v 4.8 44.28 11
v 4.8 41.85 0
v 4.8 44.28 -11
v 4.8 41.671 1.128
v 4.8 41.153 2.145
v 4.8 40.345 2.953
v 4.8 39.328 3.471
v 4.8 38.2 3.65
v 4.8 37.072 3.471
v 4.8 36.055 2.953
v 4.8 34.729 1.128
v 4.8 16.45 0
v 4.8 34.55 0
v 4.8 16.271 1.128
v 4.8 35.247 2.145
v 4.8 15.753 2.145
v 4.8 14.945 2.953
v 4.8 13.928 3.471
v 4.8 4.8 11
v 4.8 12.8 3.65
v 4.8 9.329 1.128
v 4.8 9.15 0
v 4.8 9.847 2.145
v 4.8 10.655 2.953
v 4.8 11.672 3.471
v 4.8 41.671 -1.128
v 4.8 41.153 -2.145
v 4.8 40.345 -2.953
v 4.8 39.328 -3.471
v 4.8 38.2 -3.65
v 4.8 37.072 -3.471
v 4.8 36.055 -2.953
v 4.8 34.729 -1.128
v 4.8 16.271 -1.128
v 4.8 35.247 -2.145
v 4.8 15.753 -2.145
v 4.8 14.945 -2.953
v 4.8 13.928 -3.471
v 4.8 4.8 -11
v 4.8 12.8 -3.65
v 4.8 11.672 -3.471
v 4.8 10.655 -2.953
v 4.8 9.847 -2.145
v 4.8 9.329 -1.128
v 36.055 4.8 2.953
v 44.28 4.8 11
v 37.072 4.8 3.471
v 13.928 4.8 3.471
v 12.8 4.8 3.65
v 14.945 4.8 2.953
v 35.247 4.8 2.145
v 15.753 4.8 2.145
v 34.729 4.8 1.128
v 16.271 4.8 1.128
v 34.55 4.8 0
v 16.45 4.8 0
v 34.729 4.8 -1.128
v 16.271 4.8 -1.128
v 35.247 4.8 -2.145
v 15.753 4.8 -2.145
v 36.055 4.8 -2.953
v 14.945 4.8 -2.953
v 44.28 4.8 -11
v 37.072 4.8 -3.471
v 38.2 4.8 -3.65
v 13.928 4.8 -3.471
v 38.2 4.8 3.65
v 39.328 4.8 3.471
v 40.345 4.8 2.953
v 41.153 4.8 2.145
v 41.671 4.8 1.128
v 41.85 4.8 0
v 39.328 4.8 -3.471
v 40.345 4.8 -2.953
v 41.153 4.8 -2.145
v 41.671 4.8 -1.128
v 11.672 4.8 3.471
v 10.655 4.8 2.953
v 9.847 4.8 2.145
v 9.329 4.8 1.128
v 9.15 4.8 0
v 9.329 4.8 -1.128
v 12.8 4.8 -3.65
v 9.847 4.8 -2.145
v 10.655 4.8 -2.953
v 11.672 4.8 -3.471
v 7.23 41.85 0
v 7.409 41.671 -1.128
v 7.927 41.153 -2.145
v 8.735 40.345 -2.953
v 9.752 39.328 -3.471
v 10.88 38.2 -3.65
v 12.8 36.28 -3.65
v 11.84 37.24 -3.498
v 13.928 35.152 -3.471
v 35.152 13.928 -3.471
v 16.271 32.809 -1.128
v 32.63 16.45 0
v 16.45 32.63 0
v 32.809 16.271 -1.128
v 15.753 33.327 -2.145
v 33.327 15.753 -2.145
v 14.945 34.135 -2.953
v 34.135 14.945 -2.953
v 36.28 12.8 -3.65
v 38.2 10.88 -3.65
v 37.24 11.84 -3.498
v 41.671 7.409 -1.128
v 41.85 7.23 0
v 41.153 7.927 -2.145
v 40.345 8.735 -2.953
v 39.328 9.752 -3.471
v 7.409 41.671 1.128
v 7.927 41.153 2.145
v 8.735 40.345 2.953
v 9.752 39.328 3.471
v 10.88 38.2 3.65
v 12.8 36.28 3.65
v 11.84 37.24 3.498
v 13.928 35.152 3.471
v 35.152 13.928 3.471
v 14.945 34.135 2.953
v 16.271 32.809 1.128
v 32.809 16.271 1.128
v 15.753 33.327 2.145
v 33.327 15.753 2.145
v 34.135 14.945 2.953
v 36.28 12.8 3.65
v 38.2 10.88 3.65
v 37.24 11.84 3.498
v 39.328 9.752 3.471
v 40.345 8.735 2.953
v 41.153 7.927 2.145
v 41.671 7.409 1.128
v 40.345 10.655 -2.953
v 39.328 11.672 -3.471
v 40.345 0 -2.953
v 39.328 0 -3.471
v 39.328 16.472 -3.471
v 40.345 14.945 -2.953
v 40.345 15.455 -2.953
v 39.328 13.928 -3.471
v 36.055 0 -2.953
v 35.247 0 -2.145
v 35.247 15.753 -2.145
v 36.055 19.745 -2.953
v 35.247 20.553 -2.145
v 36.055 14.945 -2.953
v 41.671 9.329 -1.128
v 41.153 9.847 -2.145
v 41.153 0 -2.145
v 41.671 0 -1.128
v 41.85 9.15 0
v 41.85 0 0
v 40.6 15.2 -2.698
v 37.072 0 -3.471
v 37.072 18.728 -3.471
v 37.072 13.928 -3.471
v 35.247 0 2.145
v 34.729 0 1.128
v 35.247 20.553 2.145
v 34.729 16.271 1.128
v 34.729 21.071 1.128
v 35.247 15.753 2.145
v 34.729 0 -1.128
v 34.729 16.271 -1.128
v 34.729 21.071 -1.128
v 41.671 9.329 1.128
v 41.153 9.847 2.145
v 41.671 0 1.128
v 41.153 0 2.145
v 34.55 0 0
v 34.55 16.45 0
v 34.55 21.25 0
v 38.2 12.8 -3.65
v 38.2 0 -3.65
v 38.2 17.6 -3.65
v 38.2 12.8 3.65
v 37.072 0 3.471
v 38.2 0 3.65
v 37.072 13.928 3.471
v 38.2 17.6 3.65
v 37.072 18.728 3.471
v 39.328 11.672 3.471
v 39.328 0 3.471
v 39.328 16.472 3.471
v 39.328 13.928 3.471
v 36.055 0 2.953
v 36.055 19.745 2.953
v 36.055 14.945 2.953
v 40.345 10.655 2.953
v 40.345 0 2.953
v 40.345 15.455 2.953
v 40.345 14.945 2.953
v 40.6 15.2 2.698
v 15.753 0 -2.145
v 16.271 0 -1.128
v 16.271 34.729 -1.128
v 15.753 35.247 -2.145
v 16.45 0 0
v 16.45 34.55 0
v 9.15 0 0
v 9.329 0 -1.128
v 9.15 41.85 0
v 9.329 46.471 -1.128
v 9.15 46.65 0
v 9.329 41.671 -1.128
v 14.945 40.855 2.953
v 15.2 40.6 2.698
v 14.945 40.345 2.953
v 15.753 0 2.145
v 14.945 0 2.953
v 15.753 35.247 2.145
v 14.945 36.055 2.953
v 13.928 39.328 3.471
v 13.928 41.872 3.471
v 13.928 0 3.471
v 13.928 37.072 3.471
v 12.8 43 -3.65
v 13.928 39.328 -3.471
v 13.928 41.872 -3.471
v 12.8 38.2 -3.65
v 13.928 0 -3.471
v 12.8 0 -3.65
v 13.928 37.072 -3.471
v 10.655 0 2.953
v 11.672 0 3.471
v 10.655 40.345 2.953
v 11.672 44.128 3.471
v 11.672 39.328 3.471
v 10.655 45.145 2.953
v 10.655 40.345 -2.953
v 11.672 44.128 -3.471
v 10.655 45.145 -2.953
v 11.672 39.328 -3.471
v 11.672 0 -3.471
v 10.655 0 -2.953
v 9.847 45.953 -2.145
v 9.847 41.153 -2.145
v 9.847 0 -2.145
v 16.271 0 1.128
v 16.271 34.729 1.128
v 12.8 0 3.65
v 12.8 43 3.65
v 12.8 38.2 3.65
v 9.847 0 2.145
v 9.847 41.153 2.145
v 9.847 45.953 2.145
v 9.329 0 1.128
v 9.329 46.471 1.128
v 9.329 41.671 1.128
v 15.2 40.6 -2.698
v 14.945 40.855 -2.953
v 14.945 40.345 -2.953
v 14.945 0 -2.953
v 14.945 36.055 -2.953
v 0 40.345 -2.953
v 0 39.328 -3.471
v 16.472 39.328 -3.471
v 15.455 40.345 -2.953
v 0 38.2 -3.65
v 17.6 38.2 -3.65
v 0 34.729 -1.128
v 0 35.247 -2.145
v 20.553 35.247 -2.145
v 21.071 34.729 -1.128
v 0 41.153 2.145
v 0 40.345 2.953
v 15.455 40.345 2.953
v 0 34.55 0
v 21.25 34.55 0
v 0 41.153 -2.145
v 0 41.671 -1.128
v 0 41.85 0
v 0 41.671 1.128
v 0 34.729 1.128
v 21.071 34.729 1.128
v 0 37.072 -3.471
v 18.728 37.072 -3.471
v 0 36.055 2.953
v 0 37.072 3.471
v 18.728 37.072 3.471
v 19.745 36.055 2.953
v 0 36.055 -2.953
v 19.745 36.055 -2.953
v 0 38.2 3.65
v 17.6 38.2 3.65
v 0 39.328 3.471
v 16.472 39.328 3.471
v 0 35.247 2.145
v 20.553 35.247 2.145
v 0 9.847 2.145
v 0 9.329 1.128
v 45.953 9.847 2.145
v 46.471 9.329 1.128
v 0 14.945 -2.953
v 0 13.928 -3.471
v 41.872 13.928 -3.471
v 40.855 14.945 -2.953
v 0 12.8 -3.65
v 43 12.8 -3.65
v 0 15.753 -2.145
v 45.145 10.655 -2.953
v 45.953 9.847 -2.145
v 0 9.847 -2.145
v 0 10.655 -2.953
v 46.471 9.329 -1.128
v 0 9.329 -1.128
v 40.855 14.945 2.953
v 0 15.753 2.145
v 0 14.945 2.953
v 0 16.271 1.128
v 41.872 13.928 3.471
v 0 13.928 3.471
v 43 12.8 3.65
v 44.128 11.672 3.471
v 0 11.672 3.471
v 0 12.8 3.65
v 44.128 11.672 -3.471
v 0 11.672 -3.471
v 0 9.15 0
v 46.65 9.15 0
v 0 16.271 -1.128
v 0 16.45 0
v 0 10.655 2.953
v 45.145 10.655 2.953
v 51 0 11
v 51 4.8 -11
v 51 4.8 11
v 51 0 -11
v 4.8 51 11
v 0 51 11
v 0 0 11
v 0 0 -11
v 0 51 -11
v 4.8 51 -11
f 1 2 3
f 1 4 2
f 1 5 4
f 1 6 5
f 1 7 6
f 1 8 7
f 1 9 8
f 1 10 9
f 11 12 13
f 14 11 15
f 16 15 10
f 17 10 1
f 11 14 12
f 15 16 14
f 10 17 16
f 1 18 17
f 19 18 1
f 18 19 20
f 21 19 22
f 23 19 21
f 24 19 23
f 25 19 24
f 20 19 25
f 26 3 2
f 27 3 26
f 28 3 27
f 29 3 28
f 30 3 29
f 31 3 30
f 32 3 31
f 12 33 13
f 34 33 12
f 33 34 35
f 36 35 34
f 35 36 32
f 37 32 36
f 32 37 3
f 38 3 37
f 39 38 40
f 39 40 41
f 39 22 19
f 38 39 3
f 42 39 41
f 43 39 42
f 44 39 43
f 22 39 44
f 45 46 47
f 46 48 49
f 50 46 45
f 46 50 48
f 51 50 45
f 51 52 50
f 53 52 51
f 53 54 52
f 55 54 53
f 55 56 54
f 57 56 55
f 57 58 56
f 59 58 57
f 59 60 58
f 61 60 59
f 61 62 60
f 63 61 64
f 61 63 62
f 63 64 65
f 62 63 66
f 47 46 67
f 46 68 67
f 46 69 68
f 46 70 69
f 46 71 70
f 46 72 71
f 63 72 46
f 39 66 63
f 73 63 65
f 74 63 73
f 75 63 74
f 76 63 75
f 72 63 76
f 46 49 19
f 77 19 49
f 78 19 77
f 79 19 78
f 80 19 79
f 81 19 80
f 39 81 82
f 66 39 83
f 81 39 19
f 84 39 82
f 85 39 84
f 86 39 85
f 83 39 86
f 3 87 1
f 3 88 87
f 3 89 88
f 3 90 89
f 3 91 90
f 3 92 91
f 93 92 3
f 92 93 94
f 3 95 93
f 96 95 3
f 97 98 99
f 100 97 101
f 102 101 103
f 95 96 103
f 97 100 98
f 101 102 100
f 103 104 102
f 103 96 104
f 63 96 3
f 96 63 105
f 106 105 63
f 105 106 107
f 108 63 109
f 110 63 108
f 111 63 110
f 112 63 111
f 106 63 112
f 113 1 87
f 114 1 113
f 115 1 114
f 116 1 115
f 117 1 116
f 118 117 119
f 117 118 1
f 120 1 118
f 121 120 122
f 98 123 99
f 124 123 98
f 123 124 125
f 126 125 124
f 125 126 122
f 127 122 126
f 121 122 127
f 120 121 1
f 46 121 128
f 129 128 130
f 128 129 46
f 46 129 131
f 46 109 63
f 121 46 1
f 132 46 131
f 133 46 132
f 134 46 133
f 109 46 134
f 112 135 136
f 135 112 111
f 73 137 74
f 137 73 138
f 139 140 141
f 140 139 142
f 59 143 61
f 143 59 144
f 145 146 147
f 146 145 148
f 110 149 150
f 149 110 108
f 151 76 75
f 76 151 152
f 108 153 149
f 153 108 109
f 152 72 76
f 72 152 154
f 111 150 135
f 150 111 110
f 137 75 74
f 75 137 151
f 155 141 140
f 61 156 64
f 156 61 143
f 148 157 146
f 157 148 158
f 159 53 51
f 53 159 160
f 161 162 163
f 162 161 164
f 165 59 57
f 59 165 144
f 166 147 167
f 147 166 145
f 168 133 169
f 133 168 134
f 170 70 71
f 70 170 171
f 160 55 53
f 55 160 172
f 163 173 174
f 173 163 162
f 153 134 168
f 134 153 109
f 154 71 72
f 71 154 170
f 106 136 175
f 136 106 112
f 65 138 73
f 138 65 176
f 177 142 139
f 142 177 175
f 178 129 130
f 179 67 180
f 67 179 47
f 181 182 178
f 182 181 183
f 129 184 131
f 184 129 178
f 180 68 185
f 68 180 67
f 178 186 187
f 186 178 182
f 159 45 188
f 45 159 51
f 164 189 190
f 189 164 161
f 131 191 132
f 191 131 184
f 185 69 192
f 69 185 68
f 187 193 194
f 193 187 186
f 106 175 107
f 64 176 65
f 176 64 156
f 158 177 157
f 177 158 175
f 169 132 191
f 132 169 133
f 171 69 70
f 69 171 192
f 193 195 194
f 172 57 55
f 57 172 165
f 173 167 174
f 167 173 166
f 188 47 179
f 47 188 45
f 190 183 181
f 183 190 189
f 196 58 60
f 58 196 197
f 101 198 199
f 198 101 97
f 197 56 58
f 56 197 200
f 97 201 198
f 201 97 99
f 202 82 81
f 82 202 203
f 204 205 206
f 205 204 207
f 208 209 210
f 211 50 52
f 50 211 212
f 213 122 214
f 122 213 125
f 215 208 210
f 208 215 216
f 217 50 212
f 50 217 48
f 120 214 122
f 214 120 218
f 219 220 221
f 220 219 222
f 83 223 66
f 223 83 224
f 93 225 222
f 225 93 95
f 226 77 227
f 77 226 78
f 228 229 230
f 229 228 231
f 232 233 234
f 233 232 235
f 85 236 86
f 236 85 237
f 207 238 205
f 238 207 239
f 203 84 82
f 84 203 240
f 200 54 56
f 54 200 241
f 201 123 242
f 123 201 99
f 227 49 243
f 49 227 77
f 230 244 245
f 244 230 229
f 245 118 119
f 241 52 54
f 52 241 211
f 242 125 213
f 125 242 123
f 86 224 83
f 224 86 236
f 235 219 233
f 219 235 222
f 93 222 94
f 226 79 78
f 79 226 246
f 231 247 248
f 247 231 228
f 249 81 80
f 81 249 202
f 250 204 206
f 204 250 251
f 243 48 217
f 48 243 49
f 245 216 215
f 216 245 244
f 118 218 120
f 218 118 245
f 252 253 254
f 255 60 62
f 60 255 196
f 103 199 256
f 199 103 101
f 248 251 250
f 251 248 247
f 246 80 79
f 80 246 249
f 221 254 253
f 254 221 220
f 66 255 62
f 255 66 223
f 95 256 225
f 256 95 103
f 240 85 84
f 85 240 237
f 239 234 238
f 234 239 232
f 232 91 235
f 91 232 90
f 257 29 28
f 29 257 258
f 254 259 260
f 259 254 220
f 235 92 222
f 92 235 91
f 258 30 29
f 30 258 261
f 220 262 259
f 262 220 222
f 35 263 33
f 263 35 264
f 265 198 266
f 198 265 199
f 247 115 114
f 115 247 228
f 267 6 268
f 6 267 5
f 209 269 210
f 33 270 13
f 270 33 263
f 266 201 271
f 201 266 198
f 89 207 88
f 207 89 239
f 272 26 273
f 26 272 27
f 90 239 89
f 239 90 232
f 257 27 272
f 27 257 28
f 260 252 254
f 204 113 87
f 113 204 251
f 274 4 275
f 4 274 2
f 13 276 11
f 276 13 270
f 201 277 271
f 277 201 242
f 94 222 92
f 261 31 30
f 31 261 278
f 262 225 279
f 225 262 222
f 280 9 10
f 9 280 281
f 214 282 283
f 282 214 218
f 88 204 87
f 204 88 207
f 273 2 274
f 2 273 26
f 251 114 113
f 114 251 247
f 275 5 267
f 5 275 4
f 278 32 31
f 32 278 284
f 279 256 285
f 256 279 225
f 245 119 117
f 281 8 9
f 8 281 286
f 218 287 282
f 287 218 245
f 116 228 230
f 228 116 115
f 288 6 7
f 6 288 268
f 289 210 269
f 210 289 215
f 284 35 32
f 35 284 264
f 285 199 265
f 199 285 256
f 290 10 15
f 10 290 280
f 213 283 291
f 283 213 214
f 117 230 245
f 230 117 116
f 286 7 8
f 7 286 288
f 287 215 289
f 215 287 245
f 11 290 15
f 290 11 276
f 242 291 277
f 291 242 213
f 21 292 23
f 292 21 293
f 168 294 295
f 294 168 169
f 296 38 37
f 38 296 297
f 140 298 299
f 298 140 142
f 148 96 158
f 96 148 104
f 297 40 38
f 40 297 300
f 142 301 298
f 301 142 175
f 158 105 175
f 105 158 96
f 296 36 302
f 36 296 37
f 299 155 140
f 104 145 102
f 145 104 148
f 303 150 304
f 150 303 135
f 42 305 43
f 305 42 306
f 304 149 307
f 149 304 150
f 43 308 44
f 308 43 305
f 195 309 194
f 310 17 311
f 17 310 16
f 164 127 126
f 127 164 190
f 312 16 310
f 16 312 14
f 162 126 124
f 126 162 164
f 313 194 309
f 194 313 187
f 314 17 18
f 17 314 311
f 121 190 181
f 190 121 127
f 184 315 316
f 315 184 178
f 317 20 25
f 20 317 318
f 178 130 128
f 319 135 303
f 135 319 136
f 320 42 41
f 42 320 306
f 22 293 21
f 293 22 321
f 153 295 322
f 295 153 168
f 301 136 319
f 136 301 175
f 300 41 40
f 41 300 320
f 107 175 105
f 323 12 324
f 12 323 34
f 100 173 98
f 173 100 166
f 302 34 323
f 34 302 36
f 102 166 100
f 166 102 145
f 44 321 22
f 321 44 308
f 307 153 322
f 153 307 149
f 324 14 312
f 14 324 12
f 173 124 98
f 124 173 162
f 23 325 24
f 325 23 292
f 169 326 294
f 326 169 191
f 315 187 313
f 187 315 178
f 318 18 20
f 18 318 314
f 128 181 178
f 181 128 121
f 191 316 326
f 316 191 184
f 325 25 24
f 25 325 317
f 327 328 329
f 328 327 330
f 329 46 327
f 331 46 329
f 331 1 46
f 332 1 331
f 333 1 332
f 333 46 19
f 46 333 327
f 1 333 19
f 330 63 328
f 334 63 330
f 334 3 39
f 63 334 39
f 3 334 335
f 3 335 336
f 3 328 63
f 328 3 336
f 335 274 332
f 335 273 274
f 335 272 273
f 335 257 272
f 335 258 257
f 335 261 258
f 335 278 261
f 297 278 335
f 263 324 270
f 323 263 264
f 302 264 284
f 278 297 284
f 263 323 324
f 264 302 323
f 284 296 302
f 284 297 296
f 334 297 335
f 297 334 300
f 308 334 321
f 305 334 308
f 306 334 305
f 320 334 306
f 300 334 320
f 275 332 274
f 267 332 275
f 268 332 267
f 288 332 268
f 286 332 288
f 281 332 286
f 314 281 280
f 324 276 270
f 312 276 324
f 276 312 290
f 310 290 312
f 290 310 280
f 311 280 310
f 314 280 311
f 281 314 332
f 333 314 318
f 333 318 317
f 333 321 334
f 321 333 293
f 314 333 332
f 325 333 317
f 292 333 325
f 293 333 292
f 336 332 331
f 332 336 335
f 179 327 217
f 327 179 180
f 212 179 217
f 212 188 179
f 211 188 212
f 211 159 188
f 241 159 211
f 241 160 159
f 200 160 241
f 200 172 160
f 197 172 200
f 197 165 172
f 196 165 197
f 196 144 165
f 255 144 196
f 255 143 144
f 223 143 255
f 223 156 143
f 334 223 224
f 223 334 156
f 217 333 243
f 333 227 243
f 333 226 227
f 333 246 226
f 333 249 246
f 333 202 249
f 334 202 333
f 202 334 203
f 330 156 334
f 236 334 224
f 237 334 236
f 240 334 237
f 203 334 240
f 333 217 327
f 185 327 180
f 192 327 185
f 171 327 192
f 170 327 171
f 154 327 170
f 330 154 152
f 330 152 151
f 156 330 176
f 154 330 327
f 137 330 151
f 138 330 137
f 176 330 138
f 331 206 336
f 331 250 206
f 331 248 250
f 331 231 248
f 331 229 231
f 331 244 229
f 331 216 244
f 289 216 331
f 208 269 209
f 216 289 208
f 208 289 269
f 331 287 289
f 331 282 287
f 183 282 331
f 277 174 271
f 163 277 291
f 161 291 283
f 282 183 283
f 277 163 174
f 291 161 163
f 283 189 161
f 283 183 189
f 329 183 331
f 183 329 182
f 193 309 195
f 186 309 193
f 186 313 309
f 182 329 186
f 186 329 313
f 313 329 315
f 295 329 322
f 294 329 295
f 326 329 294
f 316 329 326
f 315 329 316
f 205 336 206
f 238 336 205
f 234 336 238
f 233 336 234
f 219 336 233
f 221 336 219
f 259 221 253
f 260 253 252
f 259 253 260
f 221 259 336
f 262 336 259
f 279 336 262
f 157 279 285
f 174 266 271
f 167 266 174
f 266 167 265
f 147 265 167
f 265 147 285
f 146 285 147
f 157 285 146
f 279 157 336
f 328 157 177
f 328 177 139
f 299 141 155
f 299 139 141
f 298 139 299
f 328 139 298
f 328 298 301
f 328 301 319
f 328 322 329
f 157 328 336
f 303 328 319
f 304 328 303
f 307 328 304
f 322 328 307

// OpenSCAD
//Extrusion($Type = "Extruded", $Sections = 1);
//Extrusion($Type = "Hollow", $Dimension = 15, $Dimension2 = 30);
CornerBrace($Width = 22,$Length = 51, $MaterialThickness = 4.8, $HoleCenters = 25.4, $HoleSize = 7.3);

module ExtrusionSlot($Rotation = 0)
{
  rotate($Rotation, [1, 0, 0])
  {
    translate([0, 0, 2.51 * $Dimension / 6])
      cube([$Length + 1, $Dimension / 3, $Dimension / 6], center = true);
    translate([0, 0, 2.01 * $Dimension / 6])
      cube([$Length + 1, $Dimension / 2.4, $Dimension / 6], center = true);
  }
}

module Extrusion1x()
{
  color("Silver")
    difference()
    {
      cube([$Length, $Dimension, $Dimension], center = true);
      rotate(90, [0, 1, 0])
        cylinder(d = $Bore, h = $Length + 1, center = true, $fn = 20);
      ExtrusionSlot(0);
      ExtrusionSlot(90);
      ExtrusionSlot(-90);
      ExtrusionSlot(180);
    }
}

module Extrusion($Type = "Extruded", $Dimension = 15, $Dimension2 = 15, $Length = 100, $Bore = 4.8, $Thickness = 2.6, $Sections = 1)
{
  if ($Type == "Extruded")
  {
    translate([0, -$Dimension * ($Sections - 1) / 2, 0])
    for ( i = [0 : $Sections - 1])
    {
      translate([0, i * $Dimension, 0])
        Extrusion1x();
    }
  }
  else if ($Type == "Hollow")
  {
    color("Silver")
      difference()
      {
        cube([$Length, $Dimension2, $Dimension], center = true);
        cube([$Length + 1, $Dimension2 - ($Thickness * 2), $Dimension - ($Thickness * 2)], center = true);
      }
  }
}

module CornerBrace($Width = 22,$Length = 51, $MaterialThickness = 4.8, $HoleCenters = 25.4, $HoleSize = 7.3)
{
  translate([0, 0, -$Width / 2])
    color([0.7, 0.7, 0.75])
      difference()
      {
        cube([$Length, $Length, $Width]);
        translate([$Length, $MaterialThickness, -1])
          rotate(45, [0, 0, 1])
            cube([$Length, $Length * 1.5, $Width + 2]);
        translate([$MaterialThickness, $MaterialThickness, -1])
        difference()
        {
          cube([$Length - ($MaterialThickness * 2.4), $Length - $MaterialThickness - $MaterialThickness, $Width + 2]);
          translate([$Length - ($MaterialThickness * 2.4), 0, 0])
            rotate(45, [0, 0, 1])
              cube([$Length, $Length * 1.5, $Width + 2]);
        }
        translate([0, 0, $Width / 2])
        {
          rotate(-90, [1, 0, 0])
          {
            translate([($Length + $HoleCenters) / 2, 0, -1])
              cylinder(d = $HoleSize, h = $Length * 1.5, $fn = 20);
            translate([($Length - $HoleCenters) / 2, 0, -1])
              cylinder(d = $HoleSize, h = $Length * 1.5, $fn = 20);
          }
          rotate(90, [0, 1, 0])
          {
            translate([0, ($Length + $HoleCenters) / 2, -1])
              cylinder(d = $HoleSize, h = $Length * 1.5, $fn = 20);
            translate([0, ($Length - $HoleCenters) / 2, -1])
              cylinder(d = $HoleSize, h = $Length * 1.5, $fn = 20);
          }
        }
      }
}
